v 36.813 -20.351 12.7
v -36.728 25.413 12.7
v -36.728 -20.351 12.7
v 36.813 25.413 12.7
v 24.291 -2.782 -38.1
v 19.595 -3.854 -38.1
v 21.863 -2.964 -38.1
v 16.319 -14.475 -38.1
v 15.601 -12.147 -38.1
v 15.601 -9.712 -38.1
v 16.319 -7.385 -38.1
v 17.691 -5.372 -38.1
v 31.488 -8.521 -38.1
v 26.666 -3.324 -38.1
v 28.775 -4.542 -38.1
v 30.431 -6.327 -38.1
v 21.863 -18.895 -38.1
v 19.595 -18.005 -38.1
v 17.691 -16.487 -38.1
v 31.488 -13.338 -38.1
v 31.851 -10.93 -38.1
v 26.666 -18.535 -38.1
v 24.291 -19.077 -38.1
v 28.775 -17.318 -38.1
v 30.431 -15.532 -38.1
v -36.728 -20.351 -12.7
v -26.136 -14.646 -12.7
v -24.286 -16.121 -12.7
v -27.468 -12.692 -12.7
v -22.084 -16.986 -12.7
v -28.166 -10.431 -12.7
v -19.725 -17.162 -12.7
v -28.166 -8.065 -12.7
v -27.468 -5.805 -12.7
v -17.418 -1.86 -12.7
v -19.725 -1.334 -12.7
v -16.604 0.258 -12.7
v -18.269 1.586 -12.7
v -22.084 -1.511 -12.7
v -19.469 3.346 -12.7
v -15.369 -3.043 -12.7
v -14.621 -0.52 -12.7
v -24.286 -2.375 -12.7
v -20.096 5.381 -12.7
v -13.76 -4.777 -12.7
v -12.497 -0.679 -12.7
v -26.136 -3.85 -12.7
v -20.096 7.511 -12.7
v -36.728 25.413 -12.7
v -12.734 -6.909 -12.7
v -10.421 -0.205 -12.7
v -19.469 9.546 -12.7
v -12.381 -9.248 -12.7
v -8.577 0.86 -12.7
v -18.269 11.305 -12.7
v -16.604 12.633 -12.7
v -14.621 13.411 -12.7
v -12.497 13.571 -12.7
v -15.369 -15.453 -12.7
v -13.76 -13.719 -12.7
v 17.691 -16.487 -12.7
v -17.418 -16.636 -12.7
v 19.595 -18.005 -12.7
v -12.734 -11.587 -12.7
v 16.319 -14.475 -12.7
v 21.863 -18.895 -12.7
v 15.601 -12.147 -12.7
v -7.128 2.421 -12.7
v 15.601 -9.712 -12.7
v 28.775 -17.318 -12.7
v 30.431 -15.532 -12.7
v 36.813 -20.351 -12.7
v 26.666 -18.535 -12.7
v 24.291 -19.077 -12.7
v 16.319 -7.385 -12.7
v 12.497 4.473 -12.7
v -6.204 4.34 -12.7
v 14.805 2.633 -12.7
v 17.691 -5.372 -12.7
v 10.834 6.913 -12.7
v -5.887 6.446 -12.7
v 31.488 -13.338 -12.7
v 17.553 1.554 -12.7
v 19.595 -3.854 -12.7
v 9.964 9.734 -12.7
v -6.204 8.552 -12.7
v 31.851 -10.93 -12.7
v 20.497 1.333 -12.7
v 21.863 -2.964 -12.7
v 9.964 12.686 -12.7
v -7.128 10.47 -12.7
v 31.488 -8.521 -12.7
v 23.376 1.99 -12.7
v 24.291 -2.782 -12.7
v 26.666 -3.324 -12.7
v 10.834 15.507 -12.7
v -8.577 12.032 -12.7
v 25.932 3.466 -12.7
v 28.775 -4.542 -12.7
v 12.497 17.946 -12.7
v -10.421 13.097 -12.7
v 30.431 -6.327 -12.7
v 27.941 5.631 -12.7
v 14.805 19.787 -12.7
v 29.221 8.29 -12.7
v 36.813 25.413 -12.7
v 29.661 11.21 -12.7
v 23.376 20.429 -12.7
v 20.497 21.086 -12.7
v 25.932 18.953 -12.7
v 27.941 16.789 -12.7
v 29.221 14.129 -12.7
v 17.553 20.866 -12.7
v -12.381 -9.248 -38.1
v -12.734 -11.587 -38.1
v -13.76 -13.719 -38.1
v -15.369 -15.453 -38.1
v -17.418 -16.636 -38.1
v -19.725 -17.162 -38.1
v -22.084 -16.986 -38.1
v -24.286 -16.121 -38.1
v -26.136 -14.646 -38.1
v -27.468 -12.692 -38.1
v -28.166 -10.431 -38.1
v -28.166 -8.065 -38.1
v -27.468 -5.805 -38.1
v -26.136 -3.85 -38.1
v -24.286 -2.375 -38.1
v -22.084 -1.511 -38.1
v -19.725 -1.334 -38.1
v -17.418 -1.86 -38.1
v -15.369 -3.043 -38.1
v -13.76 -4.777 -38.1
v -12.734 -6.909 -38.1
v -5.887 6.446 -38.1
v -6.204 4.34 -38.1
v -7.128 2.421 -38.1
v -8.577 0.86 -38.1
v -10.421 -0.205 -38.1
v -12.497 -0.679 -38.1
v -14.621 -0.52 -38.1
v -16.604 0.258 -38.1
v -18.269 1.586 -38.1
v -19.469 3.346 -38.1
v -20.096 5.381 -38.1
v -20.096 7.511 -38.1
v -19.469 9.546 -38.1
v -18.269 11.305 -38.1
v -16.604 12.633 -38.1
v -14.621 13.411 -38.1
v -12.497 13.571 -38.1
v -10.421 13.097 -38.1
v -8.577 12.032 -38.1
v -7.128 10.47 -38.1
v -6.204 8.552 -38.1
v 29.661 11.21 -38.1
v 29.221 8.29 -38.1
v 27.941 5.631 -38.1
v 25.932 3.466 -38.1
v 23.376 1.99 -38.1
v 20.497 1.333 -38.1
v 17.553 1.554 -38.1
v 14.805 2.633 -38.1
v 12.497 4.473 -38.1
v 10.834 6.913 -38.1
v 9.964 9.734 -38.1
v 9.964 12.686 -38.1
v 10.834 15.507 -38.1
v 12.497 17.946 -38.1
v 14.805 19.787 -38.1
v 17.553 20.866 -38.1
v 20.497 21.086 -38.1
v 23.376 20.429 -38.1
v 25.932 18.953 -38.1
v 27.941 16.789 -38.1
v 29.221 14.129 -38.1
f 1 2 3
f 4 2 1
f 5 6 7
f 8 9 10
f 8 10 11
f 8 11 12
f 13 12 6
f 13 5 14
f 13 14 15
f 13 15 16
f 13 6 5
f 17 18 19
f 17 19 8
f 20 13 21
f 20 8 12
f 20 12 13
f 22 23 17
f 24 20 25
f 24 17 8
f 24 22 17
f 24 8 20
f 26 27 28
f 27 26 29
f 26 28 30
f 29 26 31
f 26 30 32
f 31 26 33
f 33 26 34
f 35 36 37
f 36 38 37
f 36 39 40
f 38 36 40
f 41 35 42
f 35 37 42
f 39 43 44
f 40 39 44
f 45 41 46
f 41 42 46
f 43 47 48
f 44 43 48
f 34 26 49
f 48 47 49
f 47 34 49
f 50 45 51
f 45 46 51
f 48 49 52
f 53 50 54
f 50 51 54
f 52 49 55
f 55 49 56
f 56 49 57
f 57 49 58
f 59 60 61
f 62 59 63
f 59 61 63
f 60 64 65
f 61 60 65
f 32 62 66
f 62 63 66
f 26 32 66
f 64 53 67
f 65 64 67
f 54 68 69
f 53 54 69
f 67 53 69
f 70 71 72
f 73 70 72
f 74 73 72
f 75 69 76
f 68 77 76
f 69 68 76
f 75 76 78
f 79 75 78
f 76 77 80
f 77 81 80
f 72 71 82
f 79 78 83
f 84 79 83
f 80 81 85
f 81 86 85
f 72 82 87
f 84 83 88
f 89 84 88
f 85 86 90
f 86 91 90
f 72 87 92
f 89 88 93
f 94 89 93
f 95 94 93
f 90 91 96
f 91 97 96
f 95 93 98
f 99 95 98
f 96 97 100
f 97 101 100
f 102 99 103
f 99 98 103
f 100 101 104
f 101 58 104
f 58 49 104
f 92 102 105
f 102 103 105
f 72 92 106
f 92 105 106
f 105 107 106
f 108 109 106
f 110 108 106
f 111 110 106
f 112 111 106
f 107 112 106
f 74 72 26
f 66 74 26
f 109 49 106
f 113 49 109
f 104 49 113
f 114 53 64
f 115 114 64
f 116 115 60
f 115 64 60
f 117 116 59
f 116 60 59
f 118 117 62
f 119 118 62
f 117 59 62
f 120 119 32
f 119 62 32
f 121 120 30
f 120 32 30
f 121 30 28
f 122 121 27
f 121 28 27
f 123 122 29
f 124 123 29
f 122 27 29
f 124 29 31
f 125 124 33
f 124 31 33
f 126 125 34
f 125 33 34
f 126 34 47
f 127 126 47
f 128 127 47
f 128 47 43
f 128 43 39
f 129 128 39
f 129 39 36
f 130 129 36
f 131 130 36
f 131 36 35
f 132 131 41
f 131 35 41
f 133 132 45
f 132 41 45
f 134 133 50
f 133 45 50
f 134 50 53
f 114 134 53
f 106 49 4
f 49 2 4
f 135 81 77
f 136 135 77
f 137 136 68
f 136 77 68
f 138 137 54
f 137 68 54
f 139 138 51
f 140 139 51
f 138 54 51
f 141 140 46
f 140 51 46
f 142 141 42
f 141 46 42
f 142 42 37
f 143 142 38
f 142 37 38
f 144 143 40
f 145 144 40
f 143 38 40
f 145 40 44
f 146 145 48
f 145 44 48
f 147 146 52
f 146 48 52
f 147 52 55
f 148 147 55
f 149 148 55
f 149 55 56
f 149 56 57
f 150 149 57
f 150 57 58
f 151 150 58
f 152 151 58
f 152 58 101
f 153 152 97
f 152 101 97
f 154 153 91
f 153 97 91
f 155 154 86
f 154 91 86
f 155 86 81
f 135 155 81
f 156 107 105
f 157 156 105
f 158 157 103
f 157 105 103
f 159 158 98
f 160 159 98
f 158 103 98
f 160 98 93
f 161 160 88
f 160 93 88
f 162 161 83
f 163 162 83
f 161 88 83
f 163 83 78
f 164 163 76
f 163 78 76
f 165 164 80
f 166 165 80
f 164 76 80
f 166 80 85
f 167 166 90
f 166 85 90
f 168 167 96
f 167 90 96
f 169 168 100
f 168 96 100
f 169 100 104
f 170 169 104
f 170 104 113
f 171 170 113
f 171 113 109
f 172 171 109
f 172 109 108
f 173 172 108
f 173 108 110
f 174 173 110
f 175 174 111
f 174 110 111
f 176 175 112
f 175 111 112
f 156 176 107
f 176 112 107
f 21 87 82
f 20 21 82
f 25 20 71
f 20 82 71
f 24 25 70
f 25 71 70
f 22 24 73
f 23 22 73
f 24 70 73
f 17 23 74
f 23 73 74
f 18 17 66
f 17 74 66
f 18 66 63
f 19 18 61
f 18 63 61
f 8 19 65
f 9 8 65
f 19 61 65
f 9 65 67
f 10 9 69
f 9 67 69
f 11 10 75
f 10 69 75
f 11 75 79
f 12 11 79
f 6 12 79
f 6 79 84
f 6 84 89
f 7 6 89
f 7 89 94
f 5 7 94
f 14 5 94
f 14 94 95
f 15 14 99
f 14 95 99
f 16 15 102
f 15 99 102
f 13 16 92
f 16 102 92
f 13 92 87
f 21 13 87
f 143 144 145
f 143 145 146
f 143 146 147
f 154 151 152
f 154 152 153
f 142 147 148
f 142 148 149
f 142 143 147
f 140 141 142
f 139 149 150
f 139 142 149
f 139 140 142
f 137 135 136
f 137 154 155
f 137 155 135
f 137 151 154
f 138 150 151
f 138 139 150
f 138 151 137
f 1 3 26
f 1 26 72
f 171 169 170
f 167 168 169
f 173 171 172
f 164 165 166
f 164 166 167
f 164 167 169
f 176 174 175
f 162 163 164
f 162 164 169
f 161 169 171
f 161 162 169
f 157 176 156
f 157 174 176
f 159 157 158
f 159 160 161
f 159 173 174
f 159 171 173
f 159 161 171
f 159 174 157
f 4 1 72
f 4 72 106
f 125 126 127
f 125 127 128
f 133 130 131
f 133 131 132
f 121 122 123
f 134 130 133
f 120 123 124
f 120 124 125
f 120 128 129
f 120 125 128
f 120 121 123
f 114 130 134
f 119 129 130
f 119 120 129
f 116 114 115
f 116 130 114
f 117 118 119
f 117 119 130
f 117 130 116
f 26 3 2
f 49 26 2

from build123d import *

# Parameters (mm, degrees)
F0_W          = 73.54109
F0_H          = 45.764141
F1_DEPTH      = 12.7
F1_DEPTH_BACK = 12.7
F2_R          = 8.170482
F3_DEPTH      = 25.4
F4_R          = 9.904199
F5_DEPTH      = 25.4
F6_R          = 7.936434
F7_DEPTH      = 25.4
F8_R          = 7.144879
F9_DEPTH      = 25.4


with BuildPart() as f1:
    # F0 (on Top) → F1 (new body, two sides)
    with BuildSketch(Plane.XY) as f1_sk:
        with Locations((0.04258, 2.530917)):
            Rectangle(F0_W, F0_H)
    extrude(amount=F1_DEPTH)
    extrude(f1_sk.sketch, amount=-F1_DEPTH_BACK)

    # F2 (on face) → F3 (join)
    with BuildSketch(Plane(origin=(0, 0, -12.7), x_dir=(1, 0, 0), z_dir=(0, 0, -1))):
        with Locations((23.680719, 10.929562)):
            Circle(F2_R)
    extrude(amount=F3_DEPTH)

    # F4 (on face) → F5 (join)
    with BuildSketch(Plane(origin=(0, 0, -12.7), x_dir=(1, 0, 0), z_dir=(0, 0, -1))):
        with Locations((19.757286, -11.209806)):
            Circle(F4_R)
    extrude(amount=F5_DEPTH)

    # F6 (on face) → F7 (join)
    with BuildSketch(Plane(origin=(0, 0, -12.7), x_dir=(1, 0, 0), z_dir=(0, 0, -1))):
        with Locations((-20.317776, 9.248092)):
            Circle(F6_R)
    extrude(amount=F7_DEPTH)

    # F8 (on face) → F9 (join)
    with BuildSketch(Plane(origin=(0, 0, -12.7), x_dir=(1, 0, 0), z_dir=(0, 0, -1))):
        with Locations((-13.031401, -6.44564)):
            Circle(F8_R)
    extrude(amount=F9_DEPTH)


solid = f1.part
